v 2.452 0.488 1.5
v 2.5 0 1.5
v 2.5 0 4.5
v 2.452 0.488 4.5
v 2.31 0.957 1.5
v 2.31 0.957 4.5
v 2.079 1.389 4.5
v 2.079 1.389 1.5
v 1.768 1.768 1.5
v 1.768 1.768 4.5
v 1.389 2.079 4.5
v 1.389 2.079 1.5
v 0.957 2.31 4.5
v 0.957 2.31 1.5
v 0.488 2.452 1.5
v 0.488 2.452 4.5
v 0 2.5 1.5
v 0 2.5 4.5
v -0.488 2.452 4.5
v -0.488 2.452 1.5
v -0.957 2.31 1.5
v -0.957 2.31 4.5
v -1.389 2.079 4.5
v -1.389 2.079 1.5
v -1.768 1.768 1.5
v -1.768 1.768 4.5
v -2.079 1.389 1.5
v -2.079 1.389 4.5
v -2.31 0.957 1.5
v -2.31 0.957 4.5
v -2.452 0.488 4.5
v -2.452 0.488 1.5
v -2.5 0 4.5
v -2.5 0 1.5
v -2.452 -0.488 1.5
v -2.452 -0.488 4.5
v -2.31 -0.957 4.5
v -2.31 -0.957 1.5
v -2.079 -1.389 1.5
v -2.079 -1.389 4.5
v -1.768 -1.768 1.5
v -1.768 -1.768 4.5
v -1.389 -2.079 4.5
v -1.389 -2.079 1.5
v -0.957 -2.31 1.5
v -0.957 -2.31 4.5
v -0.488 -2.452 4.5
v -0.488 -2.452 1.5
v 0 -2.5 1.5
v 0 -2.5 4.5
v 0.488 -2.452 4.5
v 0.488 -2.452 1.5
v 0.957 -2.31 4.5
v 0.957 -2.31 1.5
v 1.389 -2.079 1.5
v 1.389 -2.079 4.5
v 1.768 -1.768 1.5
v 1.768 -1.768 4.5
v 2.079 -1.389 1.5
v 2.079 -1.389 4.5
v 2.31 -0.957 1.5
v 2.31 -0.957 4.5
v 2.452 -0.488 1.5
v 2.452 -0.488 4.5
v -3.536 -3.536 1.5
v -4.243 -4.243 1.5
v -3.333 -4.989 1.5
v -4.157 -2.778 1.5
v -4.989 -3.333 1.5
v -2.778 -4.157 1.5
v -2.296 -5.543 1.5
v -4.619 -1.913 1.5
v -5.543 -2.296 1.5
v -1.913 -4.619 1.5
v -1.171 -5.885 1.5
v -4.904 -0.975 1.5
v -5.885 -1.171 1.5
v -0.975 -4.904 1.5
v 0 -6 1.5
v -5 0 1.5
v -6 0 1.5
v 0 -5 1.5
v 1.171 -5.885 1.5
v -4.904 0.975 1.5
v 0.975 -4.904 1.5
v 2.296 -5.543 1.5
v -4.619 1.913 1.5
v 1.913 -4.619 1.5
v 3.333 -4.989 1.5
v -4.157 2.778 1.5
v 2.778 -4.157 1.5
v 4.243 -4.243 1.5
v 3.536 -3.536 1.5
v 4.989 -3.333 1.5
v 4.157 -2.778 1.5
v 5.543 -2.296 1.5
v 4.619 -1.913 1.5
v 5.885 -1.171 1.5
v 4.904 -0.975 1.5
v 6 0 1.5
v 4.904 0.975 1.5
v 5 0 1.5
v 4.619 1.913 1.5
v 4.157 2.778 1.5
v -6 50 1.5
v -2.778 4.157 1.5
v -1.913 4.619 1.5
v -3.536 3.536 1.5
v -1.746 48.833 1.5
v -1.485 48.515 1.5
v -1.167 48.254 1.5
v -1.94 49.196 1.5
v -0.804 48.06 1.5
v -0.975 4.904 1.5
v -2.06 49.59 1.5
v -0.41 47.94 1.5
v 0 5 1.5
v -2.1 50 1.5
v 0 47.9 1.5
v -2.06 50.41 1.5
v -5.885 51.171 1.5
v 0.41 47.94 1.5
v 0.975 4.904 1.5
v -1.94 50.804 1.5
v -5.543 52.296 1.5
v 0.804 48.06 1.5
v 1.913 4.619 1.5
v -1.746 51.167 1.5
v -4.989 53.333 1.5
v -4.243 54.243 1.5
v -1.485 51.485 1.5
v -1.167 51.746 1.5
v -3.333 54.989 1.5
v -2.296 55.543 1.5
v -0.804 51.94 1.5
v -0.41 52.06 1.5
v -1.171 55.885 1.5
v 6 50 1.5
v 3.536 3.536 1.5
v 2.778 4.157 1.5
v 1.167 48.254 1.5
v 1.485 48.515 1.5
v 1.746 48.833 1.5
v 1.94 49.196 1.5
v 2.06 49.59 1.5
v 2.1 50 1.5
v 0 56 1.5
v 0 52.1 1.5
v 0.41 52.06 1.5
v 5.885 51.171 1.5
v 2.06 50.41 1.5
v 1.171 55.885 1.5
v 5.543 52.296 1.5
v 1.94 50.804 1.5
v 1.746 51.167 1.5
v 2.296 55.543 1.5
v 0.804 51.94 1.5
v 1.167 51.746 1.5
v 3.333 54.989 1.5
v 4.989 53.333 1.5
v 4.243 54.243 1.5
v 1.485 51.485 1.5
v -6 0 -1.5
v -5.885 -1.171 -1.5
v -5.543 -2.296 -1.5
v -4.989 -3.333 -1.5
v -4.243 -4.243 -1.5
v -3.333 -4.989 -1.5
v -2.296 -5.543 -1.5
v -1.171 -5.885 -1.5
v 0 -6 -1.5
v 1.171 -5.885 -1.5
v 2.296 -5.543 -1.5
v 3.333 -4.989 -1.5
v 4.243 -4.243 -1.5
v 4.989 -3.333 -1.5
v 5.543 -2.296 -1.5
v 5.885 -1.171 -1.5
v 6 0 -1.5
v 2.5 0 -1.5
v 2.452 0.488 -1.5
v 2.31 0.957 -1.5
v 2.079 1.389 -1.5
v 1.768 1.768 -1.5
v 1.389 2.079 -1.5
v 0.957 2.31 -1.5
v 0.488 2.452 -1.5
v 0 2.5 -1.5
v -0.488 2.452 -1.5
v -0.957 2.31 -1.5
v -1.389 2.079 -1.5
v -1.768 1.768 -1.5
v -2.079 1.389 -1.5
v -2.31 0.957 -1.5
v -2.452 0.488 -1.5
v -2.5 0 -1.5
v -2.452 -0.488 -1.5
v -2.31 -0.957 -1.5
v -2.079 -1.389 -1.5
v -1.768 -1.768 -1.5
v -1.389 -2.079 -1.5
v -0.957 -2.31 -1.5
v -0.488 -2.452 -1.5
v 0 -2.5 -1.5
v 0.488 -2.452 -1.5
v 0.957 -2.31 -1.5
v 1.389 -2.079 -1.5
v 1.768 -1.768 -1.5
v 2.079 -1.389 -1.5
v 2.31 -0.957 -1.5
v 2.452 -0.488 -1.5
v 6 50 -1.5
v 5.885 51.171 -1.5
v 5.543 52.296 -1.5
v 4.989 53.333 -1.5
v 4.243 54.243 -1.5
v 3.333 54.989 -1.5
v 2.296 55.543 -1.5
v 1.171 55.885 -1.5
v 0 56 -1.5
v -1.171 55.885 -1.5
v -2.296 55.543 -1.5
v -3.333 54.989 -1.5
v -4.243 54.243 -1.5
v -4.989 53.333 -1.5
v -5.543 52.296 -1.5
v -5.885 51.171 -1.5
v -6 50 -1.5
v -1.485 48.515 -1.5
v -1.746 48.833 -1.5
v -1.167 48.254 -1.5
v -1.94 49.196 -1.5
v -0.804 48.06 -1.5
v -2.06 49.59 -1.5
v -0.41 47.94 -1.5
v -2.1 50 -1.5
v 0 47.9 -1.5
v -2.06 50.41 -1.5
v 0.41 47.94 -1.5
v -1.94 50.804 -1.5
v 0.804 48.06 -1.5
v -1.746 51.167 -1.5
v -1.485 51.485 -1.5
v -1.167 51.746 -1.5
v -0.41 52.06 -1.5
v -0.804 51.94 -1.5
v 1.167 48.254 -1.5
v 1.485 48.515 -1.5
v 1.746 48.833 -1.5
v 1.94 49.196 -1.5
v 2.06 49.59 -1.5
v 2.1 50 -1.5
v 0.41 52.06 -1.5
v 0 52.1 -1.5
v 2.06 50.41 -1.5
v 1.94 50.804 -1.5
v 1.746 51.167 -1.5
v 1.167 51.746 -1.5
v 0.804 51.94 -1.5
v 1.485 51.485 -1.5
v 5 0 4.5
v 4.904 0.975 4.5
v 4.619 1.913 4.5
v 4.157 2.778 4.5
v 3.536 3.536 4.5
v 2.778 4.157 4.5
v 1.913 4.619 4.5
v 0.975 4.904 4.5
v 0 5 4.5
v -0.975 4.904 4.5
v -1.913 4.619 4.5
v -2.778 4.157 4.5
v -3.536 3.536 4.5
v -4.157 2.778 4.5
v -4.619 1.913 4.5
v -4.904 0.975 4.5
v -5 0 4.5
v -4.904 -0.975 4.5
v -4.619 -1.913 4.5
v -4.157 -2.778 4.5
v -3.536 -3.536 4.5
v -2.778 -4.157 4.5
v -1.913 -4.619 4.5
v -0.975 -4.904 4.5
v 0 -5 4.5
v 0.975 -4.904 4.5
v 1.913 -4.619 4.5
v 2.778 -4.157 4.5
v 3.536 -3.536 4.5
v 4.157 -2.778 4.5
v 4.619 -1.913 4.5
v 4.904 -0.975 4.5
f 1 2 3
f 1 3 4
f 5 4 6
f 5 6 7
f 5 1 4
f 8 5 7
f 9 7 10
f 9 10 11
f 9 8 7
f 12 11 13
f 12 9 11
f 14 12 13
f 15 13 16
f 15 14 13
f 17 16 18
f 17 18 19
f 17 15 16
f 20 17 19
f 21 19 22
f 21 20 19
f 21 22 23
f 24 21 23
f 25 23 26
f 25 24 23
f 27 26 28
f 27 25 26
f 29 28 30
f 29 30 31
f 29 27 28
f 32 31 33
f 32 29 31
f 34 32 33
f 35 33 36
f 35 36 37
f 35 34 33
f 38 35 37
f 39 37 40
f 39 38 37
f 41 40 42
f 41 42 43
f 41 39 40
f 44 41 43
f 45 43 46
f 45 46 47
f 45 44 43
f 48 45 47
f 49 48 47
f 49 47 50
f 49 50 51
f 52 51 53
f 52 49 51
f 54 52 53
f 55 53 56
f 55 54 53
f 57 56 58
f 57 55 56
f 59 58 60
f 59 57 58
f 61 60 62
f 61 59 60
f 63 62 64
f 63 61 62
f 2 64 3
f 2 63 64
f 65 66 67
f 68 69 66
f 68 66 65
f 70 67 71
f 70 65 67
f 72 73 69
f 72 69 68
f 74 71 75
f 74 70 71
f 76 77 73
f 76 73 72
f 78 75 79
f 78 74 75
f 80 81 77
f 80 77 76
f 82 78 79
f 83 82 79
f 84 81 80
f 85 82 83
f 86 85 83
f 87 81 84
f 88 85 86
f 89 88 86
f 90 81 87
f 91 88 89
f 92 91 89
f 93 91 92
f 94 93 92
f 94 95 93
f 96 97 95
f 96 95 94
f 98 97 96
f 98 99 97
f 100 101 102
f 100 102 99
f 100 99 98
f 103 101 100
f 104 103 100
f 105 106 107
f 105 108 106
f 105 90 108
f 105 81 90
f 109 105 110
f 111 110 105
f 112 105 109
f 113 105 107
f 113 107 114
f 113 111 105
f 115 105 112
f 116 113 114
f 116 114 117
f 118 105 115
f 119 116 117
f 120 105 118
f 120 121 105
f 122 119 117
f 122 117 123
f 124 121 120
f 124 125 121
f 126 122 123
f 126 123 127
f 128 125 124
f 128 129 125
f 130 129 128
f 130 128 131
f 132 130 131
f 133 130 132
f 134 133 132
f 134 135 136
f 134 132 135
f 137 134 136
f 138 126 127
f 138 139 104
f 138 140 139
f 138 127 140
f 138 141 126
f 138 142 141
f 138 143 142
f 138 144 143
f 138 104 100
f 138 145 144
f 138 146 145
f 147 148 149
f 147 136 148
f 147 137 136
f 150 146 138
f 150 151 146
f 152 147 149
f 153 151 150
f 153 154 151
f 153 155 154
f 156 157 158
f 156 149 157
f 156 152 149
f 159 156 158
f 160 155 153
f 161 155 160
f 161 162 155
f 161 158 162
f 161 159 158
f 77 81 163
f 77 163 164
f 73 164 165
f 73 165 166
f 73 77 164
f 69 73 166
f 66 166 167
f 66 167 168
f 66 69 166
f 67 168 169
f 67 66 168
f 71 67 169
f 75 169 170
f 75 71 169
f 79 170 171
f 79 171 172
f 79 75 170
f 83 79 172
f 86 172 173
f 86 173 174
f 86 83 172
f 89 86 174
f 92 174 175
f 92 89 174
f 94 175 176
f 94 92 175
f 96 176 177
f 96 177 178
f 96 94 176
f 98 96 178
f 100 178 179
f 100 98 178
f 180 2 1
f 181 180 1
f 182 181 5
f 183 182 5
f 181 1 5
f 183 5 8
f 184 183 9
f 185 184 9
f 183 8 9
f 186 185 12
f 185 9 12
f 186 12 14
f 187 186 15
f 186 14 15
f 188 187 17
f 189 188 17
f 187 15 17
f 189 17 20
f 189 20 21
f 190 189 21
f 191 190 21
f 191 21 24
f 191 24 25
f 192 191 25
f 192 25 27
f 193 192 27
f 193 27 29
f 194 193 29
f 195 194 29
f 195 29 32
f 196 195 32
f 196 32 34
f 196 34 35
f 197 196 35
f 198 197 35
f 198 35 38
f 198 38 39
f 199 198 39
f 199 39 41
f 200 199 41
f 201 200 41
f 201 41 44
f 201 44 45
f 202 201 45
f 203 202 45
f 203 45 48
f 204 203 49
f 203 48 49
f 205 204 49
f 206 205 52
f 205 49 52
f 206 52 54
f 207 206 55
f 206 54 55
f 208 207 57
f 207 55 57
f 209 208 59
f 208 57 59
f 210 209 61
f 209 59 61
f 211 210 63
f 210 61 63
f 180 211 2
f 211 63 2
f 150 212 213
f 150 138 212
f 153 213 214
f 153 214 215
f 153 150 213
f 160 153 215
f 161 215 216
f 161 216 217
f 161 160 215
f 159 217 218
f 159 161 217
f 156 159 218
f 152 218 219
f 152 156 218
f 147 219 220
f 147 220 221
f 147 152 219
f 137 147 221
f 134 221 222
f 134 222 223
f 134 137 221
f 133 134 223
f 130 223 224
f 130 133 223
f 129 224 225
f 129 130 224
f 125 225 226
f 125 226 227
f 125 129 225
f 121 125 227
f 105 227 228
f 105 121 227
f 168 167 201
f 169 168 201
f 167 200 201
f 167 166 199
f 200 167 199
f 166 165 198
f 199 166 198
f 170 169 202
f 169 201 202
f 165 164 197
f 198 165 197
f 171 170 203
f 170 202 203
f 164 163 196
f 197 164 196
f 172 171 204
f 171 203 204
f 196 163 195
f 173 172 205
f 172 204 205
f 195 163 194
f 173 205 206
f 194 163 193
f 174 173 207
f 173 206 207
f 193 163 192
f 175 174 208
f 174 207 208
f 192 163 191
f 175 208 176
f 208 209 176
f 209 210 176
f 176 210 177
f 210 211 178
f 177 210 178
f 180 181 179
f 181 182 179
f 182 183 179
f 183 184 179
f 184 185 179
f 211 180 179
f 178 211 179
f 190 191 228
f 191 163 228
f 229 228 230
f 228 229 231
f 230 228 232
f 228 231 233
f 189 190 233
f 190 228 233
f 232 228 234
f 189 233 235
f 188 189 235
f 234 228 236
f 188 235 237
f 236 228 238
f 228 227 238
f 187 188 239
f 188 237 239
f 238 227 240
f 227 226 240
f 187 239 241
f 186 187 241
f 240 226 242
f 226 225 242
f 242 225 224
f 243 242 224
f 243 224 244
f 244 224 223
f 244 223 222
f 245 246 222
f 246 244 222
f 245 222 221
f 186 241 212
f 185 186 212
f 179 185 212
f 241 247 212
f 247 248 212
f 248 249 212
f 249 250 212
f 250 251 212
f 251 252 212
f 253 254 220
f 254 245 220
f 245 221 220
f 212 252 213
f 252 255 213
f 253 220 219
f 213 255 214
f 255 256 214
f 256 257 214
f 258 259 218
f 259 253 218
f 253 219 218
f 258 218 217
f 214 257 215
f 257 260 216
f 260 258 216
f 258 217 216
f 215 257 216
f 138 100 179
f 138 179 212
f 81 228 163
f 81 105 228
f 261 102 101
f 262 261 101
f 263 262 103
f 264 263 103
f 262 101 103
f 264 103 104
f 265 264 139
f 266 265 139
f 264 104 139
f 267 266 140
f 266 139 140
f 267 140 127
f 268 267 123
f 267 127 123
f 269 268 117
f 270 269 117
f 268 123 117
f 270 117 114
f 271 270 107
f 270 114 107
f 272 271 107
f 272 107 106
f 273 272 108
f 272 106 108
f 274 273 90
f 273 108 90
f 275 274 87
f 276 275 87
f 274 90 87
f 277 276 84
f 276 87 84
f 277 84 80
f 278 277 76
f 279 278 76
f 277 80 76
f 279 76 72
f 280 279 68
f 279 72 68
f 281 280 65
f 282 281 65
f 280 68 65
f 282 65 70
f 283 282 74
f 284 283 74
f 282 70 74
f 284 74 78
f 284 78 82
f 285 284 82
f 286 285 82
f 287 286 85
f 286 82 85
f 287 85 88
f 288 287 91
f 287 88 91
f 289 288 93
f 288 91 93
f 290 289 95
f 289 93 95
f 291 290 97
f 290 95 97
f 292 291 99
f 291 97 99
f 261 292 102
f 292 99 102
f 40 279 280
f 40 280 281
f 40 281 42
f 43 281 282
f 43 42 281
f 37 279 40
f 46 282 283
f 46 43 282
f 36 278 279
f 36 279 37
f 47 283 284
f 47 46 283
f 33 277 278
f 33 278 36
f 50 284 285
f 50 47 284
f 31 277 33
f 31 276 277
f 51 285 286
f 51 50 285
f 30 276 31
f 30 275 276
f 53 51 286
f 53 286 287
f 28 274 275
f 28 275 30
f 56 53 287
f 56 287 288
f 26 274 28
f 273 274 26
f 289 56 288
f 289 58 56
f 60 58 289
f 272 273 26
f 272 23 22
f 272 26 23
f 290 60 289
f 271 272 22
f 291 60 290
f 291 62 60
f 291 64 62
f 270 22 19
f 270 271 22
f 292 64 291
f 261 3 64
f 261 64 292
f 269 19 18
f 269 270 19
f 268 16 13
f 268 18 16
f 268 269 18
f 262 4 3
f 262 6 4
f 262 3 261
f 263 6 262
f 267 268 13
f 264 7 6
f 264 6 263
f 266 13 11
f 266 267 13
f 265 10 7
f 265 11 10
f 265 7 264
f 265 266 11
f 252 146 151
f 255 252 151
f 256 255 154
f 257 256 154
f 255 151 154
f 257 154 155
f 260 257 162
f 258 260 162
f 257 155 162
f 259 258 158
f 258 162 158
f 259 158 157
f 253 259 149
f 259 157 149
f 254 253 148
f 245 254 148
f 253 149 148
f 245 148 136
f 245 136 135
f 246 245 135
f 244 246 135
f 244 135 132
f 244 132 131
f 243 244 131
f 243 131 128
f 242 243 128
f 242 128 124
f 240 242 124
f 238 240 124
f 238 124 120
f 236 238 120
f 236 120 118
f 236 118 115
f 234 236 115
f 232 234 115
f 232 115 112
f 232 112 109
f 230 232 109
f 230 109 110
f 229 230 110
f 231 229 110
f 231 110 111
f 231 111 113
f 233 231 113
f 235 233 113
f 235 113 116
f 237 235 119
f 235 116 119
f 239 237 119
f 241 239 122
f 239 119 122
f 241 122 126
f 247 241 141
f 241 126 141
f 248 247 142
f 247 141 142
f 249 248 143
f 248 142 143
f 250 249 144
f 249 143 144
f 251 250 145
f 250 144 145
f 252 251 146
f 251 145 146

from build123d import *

# Parameters (mm, degrees)
BOSS_EXTRUDE1_DEPTH = 1.5
SKETCH2_R           = 5
SKETCH2_R_2         = 2.5
BOSS_EXTRUDE2_DEPTH = 3
CUT_EXTRUDE1_REACH  = 58.4
SKETCH2_2_R         = 2.5
CUT_EXTRUDE2_REACH  = 58.4
SKETCH5_R           = 2.1


with BuildPart() as part:
    # Sketch1 → Boss-Extrude1 (new, symmetric)
    with BuildSketch(Plane.XY):
        with BuildLine():
            Line((-6, 50), (-6, 0))
            ThreePointArc((-6, 0), (0, -6), (6, 0))
            Line((6, 0), (6, 50))
            ThreePointArc((6, 50), (0, 56), (-6, 50))
        make_face()
    extrude(amount=BOSS_EXTRUDE1_DEPTH, both=True)

    # Sketch2 → Boss-Extrude2 (add)
    with BuildSketch(Plane.XY.offset(1.5)):
        Circle(SKETCH2_R)
        Circle(SKETCH2_R_2, mode=Mode.SUBTRACT)
    extrude(amount=BOSS_EXTRUDE2_DEPTH)

    # Sketch2<2> → Cut-Extrude1 (cut, up to next)
    with BuildSketch(Plane.XY.offset(1.5), mode=Mode.PRIVATE) as cut_extrude1_sk1:
        Circle(SKETCH2_2_R)
    cut_extrude1_tool1 = extrude(cut_extrude1_sk1.sketch, amount=-CUT_EXTRUDE1_REACH, mode=Mode.PRIVATE) & part.part
    add(cut_extrude1_tool1.solids().sort_by_distance((0, 0, 1.5))[0], mode=Mode.SUBTRACT)

    # Sketch5 → Cut-Extrude2 (cut, up to next)
    with BuildSketch(Plane.XY.offset(1.5), mode=Mode.PRIVATE) as cut_extrude2_sk1:
        with Locations((0, 50)):
            Circle(SKETCH5_R)
    cut_extrude2_tool1 = extrude(cut_extrude2_sk1.sketch, amount=-CUT_EXTRUDE2_REACH, mode=Mode.PRIVATE) & part.part
    add(cut_extrude2_tool1.solids().sort_by_distance((0, 50, 1.5))[0], mode=Mode.SUBTRACT)


solid = part.part
